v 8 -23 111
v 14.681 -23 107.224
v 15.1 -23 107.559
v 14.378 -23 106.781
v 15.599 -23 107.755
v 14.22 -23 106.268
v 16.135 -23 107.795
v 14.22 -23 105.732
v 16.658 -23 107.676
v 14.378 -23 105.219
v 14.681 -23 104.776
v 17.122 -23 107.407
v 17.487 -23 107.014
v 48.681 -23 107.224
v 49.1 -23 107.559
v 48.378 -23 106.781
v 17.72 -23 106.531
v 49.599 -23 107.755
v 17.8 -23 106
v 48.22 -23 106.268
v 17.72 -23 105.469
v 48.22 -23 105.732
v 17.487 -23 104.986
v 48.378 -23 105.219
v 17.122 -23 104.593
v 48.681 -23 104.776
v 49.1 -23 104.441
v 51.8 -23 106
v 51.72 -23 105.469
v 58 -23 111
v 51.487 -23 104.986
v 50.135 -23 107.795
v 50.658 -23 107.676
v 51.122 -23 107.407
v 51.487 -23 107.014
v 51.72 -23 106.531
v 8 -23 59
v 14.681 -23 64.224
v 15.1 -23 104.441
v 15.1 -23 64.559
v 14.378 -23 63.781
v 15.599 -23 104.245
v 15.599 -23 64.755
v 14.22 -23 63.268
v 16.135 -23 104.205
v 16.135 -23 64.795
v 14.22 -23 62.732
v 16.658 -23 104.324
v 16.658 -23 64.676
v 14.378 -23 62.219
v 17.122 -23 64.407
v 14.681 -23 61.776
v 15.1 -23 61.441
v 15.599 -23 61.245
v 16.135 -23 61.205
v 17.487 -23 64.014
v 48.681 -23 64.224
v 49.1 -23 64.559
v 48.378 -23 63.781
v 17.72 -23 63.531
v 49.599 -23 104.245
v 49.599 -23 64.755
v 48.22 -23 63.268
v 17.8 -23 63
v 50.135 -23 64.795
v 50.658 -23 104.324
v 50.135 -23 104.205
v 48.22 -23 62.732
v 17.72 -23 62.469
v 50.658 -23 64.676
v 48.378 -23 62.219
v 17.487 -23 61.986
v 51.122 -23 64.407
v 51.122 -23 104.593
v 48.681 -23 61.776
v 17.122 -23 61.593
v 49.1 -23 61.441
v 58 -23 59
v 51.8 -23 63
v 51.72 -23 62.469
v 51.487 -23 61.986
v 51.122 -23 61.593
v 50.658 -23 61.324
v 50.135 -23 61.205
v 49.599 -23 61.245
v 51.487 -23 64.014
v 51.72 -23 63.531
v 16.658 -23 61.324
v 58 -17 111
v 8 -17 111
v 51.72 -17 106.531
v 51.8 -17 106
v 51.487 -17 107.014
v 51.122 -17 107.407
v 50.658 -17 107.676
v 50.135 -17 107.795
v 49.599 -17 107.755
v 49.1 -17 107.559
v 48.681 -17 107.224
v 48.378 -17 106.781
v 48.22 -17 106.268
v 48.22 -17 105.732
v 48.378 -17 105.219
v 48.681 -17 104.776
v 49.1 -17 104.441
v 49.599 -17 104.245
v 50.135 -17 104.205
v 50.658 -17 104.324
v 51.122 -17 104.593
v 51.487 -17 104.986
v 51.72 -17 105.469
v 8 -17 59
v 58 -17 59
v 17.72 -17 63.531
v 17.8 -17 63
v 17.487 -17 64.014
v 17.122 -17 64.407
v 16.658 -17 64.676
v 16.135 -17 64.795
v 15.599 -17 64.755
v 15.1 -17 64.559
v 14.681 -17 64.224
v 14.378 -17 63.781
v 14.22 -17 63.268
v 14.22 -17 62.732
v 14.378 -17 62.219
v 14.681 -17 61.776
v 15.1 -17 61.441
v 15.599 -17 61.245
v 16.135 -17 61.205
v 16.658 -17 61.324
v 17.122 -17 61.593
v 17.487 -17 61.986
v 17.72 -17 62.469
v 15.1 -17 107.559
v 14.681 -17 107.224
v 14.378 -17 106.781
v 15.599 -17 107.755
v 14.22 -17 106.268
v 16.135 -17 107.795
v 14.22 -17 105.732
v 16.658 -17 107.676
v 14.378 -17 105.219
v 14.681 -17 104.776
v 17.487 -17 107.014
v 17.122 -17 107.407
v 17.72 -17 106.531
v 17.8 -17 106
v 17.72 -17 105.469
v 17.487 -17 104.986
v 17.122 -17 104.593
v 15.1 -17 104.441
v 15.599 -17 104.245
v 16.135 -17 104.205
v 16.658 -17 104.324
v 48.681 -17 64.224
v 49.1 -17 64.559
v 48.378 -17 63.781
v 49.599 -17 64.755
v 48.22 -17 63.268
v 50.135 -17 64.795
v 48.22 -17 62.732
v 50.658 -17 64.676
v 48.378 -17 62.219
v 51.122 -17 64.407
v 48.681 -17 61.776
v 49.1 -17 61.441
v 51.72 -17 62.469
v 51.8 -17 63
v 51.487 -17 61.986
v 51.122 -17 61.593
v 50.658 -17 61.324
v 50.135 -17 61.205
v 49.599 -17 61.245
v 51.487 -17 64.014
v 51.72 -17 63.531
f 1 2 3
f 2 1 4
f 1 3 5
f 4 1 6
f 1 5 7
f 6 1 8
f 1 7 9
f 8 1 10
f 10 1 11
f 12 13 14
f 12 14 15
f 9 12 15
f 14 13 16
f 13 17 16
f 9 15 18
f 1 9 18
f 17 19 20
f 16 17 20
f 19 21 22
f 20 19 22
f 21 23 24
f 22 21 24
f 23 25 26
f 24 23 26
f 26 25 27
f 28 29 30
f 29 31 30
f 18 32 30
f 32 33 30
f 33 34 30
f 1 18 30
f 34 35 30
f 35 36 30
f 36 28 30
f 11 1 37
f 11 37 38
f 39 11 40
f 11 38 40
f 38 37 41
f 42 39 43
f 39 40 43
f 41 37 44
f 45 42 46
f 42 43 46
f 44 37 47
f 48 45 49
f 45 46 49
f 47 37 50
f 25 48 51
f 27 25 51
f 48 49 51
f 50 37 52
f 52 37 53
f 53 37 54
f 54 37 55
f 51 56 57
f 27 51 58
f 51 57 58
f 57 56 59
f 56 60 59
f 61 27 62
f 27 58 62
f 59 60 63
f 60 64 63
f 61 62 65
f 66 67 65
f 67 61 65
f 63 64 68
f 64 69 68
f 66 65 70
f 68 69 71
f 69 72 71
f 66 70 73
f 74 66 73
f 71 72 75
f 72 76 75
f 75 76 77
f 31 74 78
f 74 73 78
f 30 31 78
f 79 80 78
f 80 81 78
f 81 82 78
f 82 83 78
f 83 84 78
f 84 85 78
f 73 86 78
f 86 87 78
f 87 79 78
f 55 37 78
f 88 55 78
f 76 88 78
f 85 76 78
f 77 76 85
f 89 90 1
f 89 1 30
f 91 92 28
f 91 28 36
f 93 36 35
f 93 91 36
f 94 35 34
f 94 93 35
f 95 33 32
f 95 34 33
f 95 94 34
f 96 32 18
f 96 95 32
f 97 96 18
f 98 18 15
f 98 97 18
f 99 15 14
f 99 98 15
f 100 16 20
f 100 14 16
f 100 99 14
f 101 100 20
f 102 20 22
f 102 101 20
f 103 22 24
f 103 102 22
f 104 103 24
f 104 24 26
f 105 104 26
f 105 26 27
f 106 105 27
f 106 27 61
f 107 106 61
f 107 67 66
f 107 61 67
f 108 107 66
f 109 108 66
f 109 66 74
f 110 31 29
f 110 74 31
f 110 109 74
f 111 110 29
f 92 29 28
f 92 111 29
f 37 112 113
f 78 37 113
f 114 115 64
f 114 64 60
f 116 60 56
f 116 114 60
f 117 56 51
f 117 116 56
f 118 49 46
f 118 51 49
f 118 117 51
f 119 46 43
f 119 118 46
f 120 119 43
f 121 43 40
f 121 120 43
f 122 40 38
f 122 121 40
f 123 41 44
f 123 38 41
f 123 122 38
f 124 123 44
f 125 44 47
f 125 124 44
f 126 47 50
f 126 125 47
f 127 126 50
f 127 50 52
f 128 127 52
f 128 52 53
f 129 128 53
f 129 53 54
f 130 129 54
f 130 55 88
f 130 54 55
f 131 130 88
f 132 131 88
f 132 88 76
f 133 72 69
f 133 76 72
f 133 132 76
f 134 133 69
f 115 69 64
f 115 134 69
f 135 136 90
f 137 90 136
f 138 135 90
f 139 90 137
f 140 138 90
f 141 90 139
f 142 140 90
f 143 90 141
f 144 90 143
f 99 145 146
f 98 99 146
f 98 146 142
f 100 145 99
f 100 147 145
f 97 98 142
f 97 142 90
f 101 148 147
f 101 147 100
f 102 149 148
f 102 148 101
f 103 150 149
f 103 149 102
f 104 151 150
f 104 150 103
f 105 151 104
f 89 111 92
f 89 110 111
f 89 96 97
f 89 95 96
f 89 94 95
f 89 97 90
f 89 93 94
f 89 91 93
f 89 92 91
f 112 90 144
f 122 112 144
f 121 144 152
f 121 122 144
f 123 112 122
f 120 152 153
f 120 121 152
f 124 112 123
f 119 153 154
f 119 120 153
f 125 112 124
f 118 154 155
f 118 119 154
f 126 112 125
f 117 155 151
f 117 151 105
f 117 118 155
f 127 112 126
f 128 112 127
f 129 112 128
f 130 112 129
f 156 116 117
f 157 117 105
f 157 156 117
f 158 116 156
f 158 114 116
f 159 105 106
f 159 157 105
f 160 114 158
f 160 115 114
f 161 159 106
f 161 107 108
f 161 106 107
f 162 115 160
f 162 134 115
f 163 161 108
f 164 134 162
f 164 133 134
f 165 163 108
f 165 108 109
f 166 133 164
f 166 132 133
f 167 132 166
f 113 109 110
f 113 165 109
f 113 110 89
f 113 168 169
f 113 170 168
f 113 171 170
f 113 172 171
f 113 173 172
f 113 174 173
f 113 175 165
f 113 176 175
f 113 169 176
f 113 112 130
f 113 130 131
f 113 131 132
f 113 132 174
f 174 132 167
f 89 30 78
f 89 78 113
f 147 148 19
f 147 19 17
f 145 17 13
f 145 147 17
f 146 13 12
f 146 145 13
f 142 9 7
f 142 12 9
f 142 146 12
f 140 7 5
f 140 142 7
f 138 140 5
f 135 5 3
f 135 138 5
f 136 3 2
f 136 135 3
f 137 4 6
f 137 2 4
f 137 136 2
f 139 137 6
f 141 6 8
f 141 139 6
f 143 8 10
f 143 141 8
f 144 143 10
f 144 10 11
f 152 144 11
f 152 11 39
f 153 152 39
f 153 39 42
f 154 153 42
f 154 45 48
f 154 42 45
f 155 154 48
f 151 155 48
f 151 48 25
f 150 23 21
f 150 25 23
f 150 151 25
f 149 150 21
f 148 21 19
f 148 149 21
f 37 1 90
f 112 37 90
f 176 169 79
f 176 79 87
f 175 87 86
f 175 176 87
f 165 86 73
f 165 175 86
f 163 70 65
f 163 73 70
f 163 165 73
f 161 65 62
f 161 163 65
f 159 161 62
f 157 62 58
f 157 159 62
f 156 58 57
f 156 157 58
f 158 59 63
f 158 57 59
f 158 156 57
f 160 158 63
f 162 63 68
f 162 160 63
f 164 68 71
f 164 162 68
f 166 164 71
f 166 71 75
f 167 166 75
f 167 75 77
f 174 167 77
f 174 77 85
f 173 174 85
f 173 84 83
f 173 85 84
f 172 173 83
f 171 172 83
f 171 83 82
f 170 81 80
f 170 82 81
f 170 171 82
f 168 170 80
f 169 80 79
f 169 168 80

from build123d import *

# Parameters (mm, degrees)
CYLINDER107_R          = 1.8
CYLINDER107_DEPTH      = 34
CYLINDER107_ROLL_ANGLE = 90
CYLINDER106_R          = 1.8
CYLINDER106_DEPTH      = 34
CYLINDER106_ROLL_ANGLE = 90
CYLINDER109_R          = 1.8
CYLINDER109_DEPTH      = 34
CYLINDER109_ROLL_ANGLE = 90
CYLINDER108_R          = 1.8
CYLINDER108_DEPTH      = 34
CYLINDER108_ROLL_ANGLE = 90
BOX054_W               = 50
BOX054_H               = 6
BOX054_DEPTH           = 52


with BuildPart() as cilindro063:
    # Cylinder107 → Cylinder107 (new body)
    with BuildSketch(Plane.XY):
        Circle(CYLINDER107_R)
    extrude(amount=CYLINDER107_DEPTH)


with BuildPart() as cilindro063_1:
    # Cylinder107 roll: moved
    add(cilindro063.part.rotate(Axis((0, 0, 0), (1, 0, 0)), CYLINDER107_ROLL_ANGLE))


with BuildPart() as cilindro063_2:
    # Cylinder107 placement: moved
    add(cilindro063_1.part.moved(Location((16, -10, 63))))


with BuildPart() as fusion059:
    # Cylinder106 → Cylinder106 (new body)
    with BuildSketch(Plane.XY):
        Circle(CYLINDER106_R)
    extrude(amount=CYLINDER106_DEPTH)


with BuildPart() as fusion059_1:
    # Cylinder106 roll: moved
    add(fusion059.part.rotate(Axis((0, 0, 0), (1, 0, 0)), CYLINDER106_ROLL_ANGLE))


with BuildPart() as fusion059_2:
    # Cylinder106 placement: moved
    add(fusion059_1.part.moved(Location((50, -10, 63))))

    # Fusion059: union Cilindro063
    add(cilindro063_2.part)


with BuildPart() as cilindro065:
    # Cylinder109 → Cylinder109 (new body)
    with BuildSketch(Plane.XY):
        Circle(CYLINDER109_R)
    extrude(amount=CYLINDER109_DEPTH)


with BuildPart() as cilindro065_1:
    # Cylinder109 roll: moved
    add(cilindro065.part.rotate(Axis((0, 0, 0), (1, 0, 0)), CYLINDER109_ROLL_ANGLE))


with BuildPart() as cilindro065_2:
    # Cylinder109 placement: moved
    add(cilindro065_1.part.moved(Location((16, -10, 63))))


with BuildPart() as fusion061:
    # Cylinder108 → Cylinder108 (new body)
    with BuildSketch(Plane.XY):
        Circle(CYLINDER108_R)
    extrude(amount=CYLINDER108_DEPTH)


with BuildPart() as fusion061_1:
    # Cylinder108 roll: moved
    add(fusion061.part.rotate(Axis((0, 0, 0), (1, 0, 0)), CYLINDER108_ROLL_ANGLE))


with BuildPart() as fusion061_2:
    # Cylinder108 placement: moved
    add(fusion061_1.part.moved(Location((50, -10, 63))))

    # Fusion060: union Cilindro065
    add(cilindro065_2.part)


with BuildPart() as fusion061_3:
    # Fusion060 placement: moved
    add(fusion061_2.part.moved(Location((0, 0, 43))))

    # Fusion061: union Fusion059
    add(fusion059_2.part)


with BuildPart() as base_effector001:
    # Box054 → Box054 (new body)
    with BuildSketch(Plane(origin=(8, -23, 59), x_dir=(1, 0, 0), z_dir=(0, 0, 1))):
        with Locations((25, 3)):
            Rectangle(BOX054_W, BOX054_H)
    extrude(amount=BOX054_DEPTH)

    # Cut126: cut Fusion061
    add(fusion061_3.part, mode=Mode.SUBTRACT)


solid = base_effector001.part
